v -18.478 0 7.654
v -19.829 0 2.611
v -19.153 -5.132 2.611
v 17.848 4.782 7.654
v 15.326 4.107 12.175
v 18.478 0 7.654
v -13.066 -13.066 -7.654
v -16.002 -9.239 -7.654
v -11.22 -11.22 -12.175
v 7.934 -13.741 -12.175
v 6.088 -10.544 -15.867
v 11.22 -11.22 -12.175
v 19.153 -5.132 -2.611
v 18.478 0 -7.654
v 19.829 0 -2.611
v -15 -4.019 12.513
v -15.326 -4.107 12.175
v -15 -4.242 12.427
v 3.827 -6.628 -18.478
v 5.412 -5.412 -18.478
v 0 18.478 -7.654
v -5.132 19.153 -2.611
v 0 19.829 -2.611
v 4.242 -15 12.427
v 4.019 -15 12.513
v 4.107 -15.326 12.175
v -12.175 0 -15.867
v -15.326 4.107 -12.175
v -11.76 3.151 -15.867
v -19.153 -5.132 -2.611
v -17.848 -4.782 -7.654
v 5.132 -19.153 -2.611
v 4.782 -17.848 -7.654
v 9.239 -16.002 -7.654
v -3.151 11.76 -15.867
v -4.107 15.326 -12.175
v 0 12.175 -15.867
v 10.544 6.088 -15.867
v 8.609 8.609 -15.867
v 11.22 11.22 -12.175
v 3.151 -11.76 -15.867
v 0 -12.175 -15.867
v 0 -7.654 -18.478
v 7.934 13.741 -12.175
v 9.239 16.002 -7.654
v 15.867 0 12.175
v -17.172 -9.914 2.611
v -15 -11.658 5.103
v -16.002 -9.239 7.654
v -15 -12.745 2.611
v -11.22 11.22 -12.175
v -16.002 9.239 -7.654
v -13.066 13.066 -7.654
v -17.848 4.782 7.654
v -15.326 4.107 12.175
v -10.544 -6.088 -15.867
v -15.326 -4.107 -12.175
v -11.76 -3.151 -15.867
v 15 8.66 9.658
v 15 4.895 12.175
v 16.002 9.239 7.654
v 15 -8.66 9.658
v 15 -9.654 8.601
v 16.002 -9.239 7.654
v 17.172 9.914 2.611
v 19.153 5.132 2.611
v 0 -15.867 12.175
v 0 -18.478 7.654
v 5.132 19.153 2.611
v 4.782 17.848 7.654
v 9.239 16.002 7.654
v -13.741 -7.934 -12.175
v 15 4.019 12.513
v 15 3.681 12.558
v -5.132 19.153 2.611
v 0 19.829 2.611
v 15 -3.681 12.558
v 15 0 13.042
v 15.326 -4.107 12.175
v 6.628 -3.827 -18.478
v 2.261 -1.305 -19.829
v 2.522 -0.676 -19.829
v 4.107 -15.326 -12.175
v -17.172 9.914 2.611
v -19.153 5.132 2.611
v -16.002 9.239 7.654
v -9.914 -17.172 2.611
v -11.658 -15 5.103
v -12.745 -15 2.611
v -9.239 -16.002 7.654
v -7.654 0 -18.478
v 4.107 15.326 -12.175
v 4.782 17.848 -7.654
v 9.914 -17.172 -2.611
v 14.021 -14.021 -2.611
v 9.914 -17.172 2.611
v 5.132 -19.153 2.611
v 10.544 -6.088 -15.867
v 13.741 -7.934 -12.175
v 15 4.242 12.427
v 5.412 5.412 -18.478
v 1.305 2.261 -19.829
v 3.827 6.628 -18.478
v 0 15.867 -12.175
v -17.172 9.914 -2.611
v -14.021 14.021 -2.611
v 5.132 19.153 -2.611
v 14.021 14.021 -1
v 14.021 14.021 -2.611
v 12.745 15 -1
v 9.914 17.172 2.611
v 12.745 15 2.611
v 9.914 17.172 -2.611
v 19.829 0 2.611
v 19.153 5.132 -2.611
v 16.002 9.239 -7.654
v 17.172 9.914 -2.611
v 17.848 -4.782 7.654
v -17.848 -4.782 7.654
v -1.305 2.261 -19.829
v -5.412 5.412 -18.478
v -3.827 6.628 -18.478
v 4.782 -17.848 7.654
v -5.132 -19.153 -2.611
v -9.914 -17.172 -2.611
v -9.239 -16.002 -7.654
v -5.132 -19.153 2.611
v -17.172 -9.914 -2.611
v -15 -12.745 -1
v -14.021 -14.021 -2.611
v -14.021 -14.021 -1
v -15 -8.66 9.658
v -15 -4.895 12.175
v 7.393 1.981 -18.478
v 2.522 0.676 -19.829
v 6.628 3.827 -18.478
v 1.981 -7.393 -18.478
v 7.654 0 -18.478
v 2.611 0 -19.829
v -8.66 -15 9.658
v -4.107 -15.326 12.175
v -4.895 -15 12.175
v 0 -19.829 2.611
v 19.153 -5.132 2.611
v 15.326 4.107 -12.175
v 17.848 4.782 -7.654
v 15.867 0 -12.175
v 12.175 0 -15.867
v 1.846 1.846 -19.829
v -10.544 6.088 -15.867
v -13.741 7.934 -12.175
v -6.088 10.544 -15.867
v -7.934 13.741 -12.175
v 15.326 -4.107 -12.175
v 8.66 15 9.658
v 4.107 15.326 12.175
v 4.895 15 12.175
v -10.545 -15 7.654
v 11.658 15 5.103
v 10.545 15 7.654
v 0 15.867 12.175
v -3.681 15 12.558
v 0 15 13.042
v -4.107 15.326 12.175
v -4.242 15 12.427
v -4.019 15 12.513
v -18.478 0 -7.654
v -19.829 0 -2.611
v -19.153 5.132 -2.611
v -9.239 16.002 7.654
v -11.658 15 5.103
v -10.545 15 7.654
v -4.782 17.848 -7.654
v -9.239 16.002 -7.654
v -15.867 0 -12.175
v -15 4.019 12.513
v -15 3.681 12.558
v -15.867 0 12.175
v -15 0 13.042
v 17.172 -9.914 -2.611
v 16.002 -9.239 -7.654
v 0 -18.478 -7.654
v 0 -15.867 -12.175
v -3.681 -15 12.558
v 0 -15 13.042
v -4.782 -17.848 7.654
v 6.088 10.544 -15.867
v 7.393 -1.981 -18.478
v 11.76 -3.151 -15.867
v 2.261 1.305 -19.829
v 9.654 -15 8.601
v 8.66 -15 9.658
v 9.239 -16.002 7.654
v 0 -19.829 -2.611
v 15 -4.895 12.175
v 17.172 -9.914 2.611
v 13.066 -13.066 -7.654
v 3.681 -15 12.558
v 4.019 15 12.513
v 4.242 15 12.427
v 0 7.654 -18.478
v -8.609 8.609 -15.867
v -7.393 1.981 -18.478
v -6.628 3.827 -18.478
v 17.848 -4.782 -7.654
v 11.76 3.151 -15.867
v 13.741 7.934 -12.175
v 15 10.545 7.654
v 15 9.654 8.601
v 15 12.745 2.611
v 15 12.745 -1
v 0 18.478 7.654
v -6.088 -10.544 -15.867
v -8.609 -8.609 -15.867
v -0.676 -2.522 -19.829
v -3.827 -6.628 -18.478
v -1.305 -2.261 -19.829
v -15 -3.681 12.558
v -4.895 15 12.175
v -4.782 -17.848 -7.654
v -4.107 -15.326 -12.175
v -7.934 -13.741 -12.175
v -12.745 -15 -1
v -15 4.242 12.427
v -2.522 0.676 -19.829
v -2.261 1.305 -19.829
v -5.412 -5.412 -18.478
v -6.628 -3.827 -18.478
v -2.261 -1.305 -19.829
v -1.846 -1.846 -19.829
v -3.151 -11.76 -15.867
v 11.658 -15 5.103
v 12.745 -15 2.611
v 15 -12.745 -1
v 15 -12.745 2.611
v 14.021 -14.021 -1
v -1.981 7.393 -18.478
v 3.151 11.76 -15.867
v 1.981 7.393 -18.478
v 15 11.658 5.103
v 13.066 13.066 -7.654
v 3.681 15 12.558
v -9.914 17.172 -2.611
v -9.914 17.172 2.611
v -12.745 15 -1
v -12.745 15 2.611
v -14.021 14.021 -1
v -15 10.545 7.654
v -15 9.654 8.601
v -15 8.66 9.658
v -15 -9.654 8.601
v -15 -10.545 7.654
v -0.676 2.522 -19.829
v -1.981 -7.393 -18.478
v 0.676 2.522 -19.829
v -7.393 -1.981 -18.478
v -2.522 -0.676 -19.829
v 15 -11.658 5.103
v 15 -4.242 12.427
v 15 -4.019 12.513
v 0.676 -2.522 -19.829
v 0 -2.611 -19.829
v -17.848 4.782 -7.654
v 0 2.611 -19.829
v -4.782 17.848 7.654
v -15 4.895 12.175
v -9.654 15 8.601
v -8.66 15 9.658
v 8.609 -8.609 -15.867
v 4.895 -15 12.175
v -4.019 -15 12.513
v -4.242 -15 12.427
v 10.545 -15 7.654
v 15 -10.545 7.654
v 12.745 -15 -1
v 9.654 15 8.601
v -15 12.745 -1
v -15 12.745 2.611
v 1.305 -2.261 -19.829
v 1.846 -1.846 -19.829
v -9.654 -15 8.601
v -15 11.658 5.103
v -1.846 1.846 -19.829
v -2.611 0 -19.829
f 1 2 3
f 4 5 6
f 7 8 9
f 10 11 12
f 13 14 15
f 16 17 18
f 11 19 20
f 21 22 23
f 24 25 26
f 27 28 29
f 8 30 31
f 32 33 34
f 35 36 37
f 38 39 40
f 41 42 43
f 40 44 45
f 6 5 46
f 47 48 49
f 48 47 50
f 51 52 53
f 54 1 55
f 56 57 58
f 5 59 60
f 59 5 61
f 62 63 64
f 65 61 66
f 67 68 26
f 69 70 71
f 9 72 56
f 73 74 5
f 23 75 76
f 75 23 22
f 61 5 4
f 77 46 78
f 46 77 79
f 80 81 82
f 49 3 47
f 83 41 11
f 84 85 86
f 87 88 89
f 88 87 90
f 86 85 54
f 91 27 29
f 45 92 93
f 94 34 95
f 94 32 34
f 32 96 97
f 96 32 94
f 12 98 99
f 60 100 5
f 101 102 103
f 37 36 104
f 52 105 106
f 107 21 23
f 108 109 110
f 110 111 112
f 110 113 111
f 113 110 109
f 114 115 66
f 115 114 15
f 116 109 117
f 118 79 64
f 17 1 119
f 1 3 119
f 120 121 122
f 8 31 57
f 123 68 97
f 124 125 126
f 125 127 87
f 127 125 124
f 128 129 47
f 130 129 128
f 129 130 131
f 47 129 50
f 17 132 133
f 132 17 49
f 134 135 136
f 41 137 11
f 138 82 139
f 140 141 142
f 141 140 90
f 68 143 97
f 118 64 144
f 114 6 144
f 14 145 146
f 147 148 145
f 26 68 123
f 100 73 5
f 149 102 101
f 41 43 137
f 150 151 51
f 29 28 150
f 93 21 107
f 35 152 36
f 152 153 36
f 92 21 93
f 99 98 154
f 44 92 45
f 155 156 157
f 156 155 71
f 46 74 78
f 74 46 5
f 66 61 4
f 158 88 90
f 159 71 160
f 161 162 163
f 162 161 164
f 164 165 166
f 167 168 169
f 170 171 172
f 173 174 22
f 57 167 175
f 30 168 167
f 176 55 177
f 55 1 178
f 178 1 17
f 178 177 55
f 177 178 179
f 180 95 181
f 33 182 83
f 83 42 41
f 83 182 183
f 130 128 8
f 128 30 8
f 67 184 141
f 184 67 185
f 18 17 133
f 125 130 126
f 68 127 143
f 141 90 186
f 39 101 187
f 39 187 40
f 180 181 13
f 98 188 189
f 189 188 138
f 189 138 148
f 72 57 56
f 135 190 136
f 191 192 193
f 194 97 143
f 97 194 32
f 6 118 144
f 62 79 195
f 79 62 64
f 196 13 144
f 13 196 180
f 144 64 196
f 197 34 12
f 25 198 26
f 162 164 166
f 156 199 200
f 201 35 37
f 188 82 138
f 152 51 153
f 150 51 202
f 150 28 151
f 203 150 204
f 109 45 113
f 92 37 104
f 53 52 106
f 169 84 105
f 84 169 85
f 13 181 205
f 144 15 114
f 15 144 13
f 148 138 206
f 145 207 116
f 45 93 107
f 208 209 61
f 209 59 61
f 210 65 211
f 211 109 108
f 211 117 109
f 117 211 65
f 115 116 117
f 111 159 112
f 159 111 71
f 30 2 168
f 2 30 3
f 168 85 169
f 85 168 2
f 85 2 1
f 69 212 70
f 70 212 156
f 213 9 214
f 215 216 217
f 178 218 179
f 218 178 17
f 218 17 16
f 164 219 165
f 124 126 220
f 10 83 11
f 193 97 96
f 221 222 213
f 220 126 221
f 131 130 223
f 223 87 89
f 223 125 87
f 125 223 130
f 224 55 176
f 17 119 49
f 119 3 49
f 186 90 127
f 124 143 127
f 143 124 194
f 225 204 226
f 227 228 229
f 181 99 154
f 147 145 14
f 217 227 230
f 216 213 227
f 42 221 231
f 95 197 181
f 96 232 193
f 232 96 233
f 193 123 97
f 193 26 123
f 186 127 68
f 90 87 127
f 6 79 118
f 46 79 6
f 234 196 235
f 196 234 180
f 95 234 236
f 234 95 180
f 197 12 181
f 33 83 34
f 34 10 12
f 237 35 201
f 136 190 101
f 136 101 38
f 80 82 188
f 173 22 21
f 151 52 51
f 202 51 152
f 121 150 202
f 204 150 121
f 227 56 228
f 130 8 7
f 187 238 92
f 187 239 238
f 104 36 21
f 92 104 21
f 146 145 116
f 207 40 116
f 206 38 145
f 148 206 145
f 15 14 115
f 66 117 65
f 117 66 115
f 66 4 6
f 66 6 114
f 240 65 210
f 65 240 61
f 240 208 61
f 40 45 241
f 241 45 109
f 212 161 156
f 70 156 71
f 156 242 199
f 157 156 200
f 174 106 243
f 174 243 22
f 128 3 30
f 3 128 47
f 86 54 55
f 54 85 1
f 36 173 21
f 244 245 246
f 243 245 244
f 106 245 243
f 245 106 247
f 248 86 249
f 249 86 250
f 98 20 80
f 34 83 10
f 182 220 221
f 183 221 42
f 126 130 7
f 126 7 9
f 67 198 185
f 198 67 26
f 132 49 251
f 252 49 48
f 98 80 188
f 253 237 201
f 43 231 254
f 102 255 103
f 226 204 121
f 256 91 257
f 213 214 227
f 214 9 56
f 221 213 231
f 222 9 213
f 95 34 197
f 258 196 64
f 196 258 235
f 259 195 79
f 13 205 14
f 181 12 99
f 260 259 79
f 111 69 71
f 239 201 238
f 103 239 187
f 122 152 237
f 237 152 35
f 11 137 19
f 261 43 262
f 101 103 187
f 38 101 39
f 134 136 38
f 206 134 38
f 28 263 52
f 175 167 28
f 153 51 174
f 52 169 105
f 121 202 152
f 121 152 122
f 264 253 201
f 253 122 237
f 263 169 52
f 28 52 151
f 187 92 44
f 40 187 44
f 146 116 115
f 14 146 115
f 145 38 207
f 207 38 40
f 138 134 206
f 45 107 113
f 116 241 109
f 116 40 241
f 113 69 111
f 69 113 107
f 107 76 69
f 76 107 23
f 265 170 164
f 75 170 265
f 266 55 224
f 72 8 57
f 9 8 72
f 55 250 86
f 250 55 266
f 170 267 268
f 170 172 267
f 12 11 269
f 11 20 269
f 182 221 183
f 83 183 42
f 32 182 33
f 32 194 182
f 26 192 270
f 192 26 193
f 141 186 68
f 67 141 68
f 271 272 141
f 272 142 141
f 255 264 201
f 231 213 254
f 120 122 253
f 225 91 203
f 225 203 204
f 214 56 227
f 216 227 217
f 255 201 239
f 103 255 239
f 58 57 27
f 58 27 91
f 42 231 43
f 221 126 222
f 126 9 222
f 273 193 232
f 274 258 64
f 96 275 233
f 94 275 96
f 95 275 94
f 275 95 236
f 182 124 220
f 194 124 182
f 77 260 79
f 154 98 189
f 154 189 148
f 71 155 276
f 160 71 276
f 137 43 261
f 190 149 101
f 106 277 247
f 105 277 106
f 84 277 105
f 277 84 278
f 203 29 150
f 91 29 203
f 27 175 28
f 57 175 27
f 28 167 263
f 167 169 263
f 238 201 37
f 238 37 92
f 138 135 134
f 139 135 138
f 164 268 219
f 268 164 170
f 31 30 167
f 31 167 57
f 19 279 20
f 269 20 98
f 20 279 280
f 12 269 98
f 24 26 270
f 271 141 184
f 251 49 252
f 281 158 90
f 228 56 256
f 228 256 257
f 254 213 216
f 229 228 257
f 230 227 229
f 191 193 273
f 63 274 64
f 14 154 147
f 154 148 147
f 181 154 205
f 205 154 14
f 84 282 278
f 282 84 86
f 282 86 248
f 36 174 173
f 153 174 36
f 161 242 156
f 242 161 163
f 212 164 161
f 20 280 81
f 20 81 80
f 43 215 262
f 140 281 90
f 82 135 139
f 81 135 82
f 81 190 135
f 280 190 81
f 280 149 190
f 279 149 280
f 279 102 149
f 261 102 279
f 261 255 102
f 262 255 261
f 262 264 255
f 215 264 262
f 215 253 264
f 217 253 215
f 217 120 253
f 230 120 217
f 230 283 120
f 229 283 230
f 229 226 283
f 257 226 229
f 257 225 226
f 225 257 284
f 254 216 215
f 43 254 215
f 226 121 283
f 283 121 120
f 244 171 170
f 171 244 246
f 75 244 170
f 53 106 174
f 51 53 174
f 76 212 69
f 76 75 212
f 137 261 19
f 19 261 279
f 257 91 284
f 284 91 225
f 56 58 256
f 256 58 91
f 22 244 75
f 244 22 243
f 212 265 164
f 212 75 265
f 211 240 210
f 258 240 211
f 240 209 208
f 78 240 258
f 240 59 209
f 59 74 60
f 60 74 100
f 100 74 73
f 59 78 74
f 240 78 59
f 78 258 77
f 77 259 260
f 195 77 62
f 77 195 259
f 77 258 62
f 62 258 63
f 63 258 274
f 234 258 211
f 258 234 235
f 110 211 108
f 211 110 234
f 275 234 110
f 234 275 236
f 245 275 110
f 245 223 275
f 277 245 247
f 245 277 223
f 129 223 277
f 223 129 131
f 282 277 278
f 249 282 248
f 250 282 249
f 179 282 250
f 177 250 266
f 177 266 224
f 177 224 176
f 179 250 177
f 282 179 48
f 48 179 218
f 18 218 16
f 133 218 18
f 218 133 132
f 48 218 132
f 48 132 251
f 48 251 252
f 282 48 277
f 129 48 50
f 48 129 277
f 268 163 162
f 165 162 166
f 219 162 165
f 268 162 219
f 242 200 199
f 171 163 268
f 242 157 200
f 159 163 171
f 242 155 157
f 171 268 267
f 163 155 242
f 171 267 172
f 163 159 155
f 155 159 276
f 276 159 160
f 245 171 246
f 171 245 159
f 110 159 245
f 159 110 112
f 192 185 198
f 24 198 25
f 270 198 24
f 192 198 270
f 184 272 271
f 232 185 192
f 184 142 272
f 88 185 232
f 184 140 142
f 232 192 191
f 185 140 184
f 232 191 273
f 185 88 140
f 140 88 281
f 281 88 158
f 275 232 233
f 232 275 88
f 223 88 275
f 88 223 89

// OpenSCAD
// Rendered by smoothrendertest.py with --render, once per fa= value. $fn fixes the
// sphere's mesh and the cube is unaffected by $fa, so the geometry is identical
// between runs and only the smoothing tolerance differs.
//
// --render matters: the F5 preview draws the primitives unmerged, so each still
// carries the tolerance it was built with and this passes without any propagation.
// Only the evaluated F6 mesh is a new PolySet produced by the boolean, which is
// where the angle is lost unless it is carried across the operation.
fa = 12;
$fa = fa;
difference() {
  sphere(20, $fn = 24);
  translate([0, 0, 14]) cube(30, center = true);
}
